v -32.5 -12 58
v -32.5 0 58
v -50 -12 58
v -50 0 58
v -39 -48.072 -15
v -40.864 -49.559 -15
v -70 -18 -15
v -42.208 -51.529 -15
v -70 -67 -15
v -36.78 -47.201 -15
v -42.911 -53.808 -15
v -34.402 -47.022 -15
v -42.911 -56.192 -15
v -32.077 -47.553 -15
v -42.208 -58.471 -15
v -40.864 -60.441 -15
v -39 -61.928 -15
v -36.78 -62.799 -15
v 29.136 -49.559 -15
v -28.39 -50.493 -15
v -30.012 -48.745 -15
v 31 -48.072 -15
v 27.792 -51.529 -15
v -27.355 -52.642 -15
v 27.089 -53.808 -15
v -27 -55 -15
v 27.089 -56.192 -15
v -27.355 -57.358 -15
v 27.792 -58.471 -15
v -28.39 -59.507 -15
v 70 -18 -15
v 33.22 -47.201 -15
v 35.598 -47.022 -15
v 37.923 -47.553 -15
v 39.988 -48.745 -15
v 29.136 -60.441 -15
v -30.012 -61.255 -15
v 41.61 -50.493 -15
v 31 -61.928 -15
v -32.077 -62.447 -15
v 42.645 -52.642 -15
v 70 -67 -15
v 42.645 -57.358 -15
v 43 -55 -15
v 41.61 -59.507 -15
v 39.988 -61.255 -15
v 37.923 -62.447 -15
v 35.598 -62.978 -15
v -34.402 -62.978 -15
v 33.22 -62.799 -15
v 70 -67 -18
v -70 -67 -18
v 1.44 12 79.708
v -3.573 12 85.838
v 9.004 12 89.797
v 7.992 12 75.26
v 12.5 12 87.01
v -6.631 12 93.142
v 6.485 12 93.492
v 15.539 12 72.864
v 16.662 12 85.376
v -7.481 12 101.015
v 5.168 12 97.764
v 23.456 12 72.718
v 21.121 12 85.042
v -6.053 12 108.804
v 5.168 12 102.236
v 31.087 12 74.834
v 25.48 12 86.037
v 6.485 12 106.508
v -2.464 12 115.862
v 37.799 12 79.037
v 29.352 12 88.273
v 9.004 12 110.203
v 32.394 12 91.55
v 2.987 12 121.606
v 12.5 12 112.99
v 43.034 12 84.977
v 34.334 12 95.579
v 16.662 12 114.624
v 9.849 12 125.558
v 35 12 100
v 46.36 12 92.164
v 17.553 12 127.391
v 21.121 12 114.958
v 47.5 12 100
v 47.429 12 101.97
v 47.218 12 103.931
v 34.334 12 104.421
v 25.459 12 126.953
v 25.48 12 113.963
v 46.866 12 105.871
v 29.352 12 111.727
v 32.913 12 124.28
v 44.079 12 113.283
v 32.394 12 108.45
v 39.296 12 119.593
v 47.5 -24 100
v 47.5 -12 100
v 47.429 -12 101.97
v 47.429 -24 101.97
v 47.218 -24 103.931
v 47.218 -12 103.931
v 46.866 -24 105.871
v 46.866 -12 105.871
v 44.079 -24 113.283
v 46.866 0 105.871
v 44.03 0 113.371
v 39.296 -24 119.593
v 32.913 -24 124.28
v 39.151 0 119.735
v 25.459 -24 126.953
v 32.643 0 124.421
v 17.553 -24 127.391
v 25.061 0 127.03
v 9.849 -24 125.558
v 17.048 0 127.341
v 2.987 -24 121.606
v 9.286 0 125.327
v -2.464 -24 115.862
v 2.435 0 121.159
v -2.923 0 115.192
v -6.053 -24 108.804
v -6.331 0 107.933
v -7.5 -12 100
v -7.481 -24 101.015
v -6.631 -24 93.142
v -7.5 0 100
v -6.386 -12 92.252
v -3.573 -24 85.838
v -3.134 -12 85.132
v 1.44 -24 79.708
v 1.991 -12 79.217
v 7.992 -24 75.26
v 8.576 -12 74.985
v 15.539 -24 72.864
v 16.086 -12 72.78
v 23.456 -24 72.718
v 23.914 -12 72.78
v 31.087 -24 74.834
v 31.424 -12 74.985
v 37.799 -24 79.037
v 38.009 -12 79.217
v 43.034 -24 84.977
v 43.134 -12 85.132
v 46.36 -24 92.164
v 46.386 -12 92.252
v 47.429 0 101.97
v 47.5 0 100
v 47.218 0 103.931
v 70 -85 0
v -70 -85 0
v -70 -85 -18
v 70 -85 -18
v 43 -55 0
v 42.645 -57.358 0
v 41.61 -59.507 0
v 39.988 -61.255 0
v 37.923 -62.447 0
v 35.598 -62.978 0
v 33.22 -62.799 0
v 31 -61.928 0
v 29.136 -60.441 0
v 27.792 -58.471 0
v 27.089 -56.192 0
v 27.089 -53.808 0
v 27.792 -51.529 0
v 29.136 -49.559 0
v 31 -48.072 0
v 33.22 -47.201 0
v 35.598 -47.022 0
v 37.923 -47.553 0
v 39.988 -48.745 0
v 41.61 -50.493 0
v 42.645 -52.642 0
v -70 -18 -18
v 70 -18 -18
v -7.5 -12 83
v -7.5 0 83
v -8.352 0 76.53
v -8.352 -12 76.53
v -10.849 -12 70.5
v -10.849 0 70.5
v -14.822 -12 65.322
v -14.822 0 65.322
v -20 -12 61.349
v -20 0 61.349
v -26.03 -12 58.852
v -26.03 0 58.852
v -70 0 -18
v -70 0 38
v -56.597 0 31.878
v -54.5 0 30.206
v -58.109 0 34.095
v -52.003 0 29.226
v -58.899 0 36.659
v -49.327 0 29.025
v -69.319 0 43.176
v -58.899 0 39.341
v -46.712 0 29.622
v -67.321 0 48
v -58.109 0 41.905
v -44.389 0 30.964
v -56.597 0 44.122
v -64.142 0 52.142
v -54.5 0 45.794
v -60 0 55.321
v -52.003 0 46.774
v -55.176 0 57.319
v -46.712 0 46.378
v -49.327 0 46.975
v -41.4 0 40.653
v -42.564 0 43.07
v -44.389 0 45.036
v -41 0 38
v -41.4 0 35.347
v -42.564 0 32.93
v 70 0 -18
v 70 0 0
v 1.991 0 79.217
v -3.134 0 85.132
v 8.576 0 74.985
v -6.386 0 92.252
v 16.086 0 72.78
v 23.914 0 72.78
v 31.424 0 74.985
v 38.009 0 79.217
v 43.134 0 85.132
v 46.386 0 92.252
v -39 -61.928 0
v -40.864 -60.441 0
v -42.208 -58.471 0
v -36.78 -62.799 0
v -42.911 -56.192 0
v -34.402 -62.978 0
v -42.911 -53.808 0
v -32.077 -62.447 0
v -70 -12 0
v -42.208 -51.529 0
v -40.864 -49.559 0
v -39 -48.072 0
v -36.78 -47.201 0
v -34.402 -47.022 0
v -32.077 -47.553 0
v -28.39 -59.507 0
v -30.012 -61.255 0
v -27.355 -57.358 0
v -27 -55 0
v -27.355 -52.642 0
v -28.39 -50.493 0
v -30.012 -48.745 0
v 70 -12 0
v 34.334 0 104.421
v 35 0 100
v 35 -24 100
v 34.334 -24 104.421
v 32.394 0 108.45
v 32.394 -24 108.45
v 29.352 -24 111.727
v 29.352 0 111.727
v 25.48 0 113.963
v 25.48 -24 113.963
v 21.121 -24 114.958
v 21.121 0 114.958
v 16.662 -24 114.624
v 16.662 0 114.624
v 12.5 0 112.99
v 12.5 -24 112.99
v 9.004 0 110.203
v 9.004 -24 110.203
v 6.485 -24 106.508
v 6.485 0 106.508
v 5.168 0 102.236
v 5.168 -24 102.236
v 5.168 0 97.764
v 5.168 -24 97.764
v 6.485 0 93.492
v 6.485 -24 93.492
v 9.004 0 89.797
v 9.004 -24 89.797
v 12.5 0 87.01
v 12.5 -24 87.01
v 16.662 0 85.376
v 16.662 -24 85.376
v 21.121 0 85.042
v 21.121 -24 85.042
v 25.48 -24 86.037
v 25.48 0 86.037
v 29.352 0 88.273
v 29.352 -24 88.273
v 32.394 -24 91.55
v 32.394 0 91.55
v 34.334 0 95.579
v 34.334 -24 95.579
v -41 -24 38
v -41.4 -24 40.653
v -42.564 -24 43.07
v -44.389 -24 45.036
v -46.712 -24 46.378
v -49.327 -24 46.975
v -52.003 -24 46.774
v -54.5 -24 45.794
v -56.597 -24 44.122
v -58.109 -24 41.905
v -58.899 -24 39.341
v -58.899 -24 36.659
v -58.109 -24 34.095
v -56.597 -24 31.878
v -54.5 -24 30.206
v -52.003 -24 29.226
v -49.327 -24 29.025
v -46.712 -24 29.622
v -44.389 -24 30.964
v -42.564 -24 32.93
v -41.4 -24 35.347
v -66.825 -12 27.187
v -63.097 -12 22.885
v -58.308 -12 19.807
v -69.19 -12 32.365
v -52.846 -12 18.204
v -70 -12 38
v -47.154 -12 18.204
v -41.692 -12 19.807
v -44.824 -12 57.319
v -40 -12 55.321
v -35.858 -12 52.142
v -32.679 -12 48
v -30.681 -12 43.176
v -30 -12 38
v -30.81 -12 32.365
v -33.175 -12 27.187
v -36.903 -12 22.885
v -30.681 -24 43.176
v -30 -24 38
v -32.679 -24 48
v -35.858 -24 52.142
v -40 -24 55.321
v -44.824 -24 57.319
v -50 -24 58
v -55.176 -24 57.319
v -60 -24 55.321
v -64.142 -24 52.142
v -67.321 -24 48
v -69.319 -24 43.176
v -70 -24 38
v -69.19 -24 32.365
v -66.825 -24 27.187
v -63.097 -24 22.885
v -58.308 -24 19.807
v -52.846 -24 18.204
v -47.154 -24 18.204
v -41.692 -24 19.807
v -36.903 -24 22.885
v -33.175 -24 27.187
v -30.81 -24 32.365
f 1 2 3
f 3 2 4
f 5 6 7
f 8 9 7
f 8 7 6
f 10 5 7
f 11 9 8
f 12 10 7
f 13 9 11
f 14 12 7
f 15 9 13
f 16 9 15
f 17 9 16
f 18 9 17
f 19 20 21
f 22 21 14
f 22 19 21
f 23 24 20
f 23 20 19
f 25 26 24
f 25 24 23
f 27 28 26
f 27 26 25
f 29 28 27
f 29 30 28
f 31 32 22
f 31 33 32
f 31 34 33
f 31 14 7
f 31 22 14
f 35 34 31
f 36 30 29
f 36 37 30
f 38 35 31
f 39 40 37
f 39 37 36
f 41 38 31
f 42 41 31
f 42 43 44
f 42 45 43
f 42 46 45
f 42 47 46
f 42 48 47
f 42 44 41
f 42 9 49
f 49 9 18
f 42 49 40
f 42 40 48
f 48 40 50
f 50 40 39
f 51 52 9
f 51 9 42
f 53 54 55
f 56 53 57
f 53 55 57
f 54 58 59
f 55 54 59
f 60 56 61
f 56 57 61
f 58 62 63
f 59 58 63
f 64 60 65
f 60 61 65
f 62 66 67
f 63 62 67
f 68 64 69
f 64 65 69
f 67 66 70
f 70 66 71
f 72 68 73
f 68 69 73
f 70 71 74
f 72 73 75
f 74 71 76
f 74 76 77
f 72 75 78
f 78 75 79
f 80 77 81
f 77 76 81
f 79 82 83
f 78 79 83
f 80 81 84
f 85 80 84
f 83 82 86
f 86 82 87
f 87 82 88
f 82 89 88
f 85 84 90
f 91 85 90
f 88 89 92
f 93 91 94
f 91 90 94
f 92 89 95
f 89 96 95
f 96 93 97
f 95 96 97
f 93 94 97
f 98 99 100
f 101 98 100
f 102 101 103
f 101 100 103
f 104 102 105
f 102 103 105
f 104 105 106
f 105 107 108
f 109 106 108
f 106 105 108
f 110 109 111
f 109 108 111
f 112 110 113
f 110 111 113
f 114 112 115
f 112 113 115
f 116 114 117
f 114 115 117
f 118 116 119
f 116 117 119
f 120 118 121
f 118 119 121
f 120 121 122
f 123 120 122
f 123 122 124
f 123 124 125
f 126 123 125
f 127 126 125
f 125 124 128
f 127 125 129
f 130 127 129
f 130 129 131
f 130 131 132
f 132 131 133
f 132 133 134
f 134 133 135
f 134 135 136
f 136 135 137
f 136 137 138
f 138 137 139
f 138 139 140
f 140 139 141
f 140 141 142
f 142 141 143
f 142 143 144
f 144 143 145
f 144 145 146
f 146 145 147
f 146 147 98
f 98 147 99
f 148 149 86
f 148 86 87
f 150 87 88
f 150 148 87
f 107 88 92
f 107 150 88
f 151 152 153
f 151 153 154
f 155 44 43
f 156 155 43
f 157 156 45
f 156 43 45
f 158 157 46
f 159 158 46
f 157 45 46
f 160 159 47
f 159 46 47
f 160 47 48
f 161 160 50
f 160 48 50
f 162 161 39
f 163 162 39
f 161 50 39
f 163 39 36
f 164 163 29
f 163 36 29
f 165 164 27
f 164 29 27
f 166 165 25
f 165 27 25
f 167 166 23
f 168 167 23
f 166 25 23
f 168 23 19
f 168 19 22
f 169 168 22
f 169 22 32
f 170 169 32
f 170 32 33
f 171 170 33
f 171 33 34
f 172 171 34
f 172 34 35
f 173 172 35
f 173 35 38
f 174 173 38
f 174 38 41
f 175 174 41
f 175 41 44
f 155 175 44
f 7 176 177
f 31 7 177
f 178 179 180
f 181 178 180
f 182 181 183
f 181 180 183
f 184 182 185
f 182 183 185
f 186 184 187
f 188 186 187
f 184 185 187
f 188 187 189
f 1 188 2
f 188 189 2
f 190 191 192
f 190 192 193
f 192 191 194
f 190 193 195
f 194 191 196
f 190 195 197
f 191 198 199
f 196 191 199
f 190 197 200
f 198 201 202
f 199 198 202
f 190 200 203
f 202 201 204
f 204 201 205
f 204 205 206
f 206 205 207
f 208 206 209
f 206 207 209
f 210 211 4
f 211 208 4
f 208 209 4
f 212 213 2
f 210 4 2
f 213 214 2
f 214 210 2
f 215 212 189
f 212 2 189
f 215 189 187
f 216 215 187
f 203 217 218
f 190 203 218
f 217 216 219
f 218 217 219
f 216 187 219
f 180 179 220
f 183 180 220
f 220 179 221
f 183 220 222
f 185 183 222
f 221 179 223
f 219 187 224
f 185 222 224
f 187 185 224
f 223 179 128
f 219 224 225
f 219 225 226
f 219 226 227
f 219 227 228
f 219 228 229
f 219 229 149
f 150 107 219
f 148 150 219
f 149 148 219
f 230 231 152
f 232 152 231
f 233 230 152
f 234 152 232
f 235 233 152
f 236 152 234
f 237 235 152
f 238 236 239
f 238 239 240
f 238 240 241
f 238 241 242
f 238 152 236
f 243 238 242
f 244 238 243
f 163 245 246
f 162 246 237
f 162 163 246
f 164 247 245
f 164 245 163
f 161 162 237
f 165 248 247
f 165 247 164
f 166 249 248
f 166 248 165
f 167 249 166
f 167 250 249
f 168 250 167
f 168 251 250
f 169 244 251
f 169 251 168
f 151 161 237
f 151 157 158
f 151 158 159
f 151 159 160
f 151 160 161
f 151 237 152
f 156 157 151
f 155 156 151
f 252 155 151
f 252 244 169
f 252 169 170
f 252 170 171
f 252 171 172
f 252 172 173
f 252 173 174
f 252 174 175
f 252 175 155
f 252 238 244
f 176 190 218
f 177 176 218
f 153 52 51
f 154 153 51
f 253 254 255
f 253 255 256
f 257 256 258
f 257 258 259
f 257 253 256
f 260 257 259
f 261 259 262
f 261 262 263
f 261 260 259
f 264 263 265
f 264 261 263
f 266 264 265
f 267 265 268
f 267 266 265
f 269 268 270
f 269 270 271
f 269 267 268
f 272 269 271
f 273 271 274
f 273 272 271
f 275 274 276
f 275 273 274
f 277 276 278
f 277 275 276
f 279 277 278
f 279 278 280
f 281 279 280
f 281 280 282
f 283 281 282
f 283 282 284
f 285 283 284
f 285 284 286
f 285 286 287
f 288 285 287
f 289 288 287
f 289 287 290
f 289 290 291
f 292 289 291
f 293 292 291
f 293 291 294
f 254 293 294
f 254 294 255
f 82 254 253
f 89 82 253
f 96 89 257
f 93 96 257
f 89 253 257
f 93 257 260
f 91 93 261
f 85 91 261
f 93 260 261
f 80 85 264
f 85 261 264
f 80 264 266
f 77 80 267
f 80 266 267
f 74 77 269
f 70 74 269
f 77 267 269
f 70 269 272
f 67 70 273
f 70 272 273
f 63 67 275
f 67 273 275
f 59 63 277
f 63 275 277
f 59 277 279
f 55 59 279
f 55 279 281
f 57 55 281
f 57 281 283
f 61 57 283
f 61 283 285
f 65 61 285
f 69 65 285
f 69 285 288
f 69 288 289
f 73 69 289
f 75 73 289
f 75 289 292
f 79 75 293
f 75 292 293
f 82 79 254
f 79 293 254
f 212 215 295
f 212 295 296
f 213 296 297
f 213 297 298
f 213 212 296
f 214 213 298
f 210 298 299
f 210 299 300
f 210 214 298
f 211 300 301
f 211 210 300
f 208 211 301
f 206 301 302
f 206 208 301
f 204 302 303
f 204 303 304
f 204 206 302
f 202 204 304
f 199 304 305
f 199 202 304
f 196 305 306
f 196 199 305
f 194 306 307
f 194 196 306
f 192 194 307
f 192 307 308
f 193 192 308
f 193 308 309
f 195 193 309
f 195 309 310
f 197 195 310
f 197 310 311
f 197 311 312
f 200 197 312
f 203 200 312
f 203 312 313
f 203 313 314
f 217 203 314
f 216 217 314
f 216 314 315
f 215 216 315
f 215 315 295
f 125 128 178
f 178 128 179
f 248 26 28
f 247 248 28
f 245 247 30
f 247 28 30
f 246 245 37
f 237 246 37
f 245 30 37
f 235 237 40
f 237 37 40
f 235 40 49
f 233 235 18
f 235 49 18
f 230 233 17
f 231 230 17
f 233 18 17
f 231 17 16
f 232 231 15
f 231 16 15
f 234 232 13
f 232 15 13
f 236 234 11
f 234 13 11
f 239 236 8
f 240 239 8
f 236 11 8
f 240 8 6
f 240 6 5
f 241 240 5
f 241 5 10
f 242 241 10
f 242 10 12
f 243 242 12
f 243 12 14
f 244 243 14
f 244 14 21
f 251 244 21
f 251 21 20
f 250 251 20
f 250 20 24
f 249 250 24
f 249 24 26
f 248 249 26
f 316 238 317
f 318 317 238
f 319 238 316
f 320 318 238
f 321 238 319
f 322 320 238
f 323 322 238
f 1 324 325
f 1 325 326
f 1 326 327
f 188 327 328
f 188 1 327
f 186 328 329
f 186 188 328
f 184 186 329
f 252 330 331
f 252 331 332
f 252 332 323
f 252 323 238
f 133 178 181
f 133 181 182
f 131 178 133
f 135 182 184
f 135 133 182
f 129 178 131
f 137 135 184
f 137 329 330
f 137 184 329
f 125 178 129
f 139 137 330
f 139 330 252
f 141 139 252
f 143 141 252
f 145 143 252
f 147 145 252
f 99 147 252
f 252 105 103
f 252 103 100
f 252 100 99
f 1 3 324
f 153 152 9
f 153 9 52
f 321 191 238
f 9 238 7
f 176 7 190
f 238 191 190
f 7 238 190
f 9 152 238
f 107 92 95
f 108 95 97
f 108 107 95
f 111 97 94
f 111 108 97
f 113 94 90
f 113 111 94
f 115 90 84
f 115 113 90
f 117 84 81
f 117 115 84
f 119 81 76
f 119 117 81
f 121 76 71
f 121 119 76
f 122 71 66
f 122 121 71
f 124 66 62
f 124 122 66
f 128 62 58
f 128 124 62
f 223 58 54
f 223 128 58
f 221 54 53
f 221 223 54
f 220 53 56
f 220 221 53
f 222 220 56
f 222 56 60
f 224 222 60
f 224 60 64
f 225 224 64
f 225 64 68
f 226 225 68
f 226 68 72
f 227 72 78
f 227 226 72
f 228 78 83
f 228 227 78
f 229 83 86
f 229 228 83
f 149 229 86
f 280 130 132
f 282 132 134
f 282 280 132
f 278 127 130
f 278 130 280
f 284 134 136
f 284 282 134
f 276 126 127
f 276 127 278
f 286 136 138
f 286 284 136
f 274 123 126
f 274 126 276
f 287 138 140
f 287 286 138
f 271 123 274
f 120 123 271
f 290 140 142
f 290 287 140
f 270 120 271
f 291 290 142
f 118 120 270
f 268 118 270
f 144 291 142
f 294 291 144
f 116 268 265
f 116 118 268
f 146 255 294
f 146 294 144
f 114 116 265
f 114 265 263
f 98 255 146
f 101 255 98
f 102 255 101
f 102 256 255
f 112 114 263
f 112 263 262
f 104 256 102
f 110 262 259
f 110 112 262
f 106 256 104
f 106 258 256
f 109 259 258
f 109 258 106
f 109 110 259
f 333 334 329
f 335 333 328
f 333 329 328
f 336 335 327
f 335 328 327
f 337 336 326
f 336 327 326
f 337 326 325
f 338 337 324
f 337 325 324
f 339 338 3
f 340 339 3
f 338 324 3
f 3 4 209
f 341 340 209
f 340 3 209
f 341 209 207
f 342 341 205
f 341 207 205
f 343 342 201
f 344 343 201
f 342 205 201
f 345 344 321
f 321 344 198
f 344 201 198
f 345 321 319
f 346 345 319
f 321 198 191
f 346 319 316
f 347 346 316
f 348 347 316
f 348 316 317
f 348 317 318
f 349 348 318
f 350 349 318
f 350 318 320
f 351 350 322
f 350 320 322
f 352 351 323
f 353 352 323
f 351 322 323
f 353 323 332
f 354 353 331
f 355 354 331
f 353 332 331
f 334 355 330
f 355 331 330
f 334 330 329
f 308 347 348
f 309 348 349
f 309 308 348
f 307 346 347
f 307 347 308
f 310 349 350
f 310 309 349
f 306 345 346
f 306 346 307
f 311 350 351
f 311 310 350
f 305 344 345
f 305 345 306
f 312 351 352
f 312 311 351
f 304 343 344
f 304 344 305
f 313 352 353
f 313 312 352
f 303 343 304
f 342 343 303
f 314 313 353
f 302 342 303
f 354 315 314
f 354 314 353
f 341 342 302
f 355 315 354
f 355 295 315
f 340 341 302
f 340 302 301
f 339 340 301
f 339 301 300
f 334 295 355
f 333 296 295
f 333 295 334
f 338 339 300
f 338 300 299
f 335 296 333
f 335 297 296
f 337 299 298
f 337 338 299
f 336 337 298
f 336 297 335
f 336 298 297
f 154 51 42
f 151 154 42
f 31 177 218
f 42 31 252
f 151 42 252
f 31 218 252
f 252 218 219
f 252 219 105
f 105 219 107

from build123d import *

# Parameters (mm, degrees)
F0_W          = 140
F0_H          = 18
F1_DEPTH      = 85
F0_R          = 9
F0_R_2        = 15
F2_DEPTH      = 12
F3_DEPTH      = 24
F4_DEPTH      = 24
F4_DEPTH_BACK = 12
F5_W          = 140
F5_H          = 49
F5_R          = 8
F6_DEPTH      = 3
F7_DEPTH      = 25


# Not quite as in the source:
# - after a boolean that leaves OpenCascade's solid faulty, fix() repairs it


with BuildPart() as f1:
    # F0 (on Front) → F1 (new body)
    with BuildSketch(Plane.XZ):
        with Locations((0, -9)):
            Rectangle(F0_W, F0_H)
    extrude(amount=F1_DEPTH)

    # F0 (on Front) → F2 (join)
    with BuildSketch(Plane.XZ):
        with BuildLine():
            Line((-70, 38), (-70, 0))
            Line((-70, 0), (70, 0))
            Line((70, 0), (46.8660884819, 105.8705442409))
            ThreePointArc((46.8660884819, 105.8705442409), (47.3410628291, 102.9523352409), (47.5, 100))
            ThreePointArc((47.5, 100), (20, 72.5), (-7.5, 100))
            Line((-7.5, 100), (-7.5, 83))
            ThreePointArc((-7.5, 83), (-14.8223304703, 65.3223304703), (-32.5, 58))
            Line((-32.5, 58), (-50, 58))
            ThreePointArc((-50, 58), (-35.8578643763, 52.1421356237), (-30, 38))
            ThreePointArc((-30, 38), (-50, 18), (-70, 38))
        make_face()
        with BuildLine():
            ThreePointArc((-50, 58), (-64.1421356237, 52.1421356237), (-70, 38))
            ThreePointArc((-70, 38), (-50, 18), (-30, 38))
            ThreePointArc((-30, 38), (-35.8578643763, 52.1421356237), (-50, 58))
        make_face()
        with Locations((-50, 38)):
            Circle(F0_R, mode=Mode.SUBTRACT)
        with BuildLine():
            ThreePointArc((47.5, 100), (47.3410628291, 102.9523352409), (46.8660884819, 105.8705442409))
            ThreePointArc((46.8660884819, 105.8705442409), (17.0476647591, 127.3410628291), (-7.5, 100))
            ThreePointArc((-7.5, 100), (20, 72.5), (47.5, 100))
        make_face()
        with Locations((20, 100)):
            Circle(F0_R_2, mode=Mode.SUBTRACT)
    extrude(amount=F2_DEPTH)

    # F0 (on Front) → F3 (join)
    with BuildSketch(Plane.XZ):
        with BuildLine():
            ThreePointArc((-50, 58), (-64.1421356237, 52.1421356237), (-70, 38))
            ThreePointArc((-70, 38), (-50, 18), (-30, 38))
            ThreePointArc((-30, 38), (-35.8578643763, 52.1421356237), (-50, 58))
        make_face()
        with Locations((-50, 38)):
            Circle(F0_R, mode=Mode.SUBTRACT)
    extrude(amount=F3_DEPTH)

    # F0 (on Front) → F4 (join, two sides)
    with BuildSketch(Plane.XZ) as f4_sk:
        with BuildLine():
            ThreePointArc((47.5, 100), (47.3410628291, 102.9523352409), (46.8660884819, 105.8705442409))
            ThreePointArc((46.8660884819, 105.8705442409), (17.0476647591, 127.3410628291), (-7.5, 100))
            ThreePointArc((-7.5, 100), (20, 72.5), (47.5, 100))
        make_face()
        with Locations((20, 100)):
            Circle(F0_R_2, mode=Mode.SUBTRACT)
    extrude(amount=F4_DEPTH)
    extrude(f4_sk.sketch, amount=-F4_DEPTH_BACK)

    add(f1.part.fix(), mode=Mode.REPLACE)

    # F5 (on face) → F6 (cut)
    with BuildSketch(Plane(origin=(0, 0, -18), x_dir=(1, 0, 0), z_dir=(0, 0, -1))):
        with Locations((0, 42.5)):
            Rectangle(F5_W, F5_H)
        with Locations((-35, 55)):
            Circle(F5_R, mode=Mode.SUBTRACT)
        with Locations((35, 55)):
            Circle(F5_R, mode=Mode.SUBTRACT)
    extrude(amount=-F6_DEPTH, mode=Mode.SUBTRACT)

    # F7 (cut): faces of the model
    f7_faces = [f1.faces().sort_by_distance(p)[0] for p in [
        (-35, -55, -18),
        (35, -55, -18),
    ]]
    extrude(f7_faces, amount=-F7_DEPTH, mode=Mode.SUBTRACT)


solid = f1.part
